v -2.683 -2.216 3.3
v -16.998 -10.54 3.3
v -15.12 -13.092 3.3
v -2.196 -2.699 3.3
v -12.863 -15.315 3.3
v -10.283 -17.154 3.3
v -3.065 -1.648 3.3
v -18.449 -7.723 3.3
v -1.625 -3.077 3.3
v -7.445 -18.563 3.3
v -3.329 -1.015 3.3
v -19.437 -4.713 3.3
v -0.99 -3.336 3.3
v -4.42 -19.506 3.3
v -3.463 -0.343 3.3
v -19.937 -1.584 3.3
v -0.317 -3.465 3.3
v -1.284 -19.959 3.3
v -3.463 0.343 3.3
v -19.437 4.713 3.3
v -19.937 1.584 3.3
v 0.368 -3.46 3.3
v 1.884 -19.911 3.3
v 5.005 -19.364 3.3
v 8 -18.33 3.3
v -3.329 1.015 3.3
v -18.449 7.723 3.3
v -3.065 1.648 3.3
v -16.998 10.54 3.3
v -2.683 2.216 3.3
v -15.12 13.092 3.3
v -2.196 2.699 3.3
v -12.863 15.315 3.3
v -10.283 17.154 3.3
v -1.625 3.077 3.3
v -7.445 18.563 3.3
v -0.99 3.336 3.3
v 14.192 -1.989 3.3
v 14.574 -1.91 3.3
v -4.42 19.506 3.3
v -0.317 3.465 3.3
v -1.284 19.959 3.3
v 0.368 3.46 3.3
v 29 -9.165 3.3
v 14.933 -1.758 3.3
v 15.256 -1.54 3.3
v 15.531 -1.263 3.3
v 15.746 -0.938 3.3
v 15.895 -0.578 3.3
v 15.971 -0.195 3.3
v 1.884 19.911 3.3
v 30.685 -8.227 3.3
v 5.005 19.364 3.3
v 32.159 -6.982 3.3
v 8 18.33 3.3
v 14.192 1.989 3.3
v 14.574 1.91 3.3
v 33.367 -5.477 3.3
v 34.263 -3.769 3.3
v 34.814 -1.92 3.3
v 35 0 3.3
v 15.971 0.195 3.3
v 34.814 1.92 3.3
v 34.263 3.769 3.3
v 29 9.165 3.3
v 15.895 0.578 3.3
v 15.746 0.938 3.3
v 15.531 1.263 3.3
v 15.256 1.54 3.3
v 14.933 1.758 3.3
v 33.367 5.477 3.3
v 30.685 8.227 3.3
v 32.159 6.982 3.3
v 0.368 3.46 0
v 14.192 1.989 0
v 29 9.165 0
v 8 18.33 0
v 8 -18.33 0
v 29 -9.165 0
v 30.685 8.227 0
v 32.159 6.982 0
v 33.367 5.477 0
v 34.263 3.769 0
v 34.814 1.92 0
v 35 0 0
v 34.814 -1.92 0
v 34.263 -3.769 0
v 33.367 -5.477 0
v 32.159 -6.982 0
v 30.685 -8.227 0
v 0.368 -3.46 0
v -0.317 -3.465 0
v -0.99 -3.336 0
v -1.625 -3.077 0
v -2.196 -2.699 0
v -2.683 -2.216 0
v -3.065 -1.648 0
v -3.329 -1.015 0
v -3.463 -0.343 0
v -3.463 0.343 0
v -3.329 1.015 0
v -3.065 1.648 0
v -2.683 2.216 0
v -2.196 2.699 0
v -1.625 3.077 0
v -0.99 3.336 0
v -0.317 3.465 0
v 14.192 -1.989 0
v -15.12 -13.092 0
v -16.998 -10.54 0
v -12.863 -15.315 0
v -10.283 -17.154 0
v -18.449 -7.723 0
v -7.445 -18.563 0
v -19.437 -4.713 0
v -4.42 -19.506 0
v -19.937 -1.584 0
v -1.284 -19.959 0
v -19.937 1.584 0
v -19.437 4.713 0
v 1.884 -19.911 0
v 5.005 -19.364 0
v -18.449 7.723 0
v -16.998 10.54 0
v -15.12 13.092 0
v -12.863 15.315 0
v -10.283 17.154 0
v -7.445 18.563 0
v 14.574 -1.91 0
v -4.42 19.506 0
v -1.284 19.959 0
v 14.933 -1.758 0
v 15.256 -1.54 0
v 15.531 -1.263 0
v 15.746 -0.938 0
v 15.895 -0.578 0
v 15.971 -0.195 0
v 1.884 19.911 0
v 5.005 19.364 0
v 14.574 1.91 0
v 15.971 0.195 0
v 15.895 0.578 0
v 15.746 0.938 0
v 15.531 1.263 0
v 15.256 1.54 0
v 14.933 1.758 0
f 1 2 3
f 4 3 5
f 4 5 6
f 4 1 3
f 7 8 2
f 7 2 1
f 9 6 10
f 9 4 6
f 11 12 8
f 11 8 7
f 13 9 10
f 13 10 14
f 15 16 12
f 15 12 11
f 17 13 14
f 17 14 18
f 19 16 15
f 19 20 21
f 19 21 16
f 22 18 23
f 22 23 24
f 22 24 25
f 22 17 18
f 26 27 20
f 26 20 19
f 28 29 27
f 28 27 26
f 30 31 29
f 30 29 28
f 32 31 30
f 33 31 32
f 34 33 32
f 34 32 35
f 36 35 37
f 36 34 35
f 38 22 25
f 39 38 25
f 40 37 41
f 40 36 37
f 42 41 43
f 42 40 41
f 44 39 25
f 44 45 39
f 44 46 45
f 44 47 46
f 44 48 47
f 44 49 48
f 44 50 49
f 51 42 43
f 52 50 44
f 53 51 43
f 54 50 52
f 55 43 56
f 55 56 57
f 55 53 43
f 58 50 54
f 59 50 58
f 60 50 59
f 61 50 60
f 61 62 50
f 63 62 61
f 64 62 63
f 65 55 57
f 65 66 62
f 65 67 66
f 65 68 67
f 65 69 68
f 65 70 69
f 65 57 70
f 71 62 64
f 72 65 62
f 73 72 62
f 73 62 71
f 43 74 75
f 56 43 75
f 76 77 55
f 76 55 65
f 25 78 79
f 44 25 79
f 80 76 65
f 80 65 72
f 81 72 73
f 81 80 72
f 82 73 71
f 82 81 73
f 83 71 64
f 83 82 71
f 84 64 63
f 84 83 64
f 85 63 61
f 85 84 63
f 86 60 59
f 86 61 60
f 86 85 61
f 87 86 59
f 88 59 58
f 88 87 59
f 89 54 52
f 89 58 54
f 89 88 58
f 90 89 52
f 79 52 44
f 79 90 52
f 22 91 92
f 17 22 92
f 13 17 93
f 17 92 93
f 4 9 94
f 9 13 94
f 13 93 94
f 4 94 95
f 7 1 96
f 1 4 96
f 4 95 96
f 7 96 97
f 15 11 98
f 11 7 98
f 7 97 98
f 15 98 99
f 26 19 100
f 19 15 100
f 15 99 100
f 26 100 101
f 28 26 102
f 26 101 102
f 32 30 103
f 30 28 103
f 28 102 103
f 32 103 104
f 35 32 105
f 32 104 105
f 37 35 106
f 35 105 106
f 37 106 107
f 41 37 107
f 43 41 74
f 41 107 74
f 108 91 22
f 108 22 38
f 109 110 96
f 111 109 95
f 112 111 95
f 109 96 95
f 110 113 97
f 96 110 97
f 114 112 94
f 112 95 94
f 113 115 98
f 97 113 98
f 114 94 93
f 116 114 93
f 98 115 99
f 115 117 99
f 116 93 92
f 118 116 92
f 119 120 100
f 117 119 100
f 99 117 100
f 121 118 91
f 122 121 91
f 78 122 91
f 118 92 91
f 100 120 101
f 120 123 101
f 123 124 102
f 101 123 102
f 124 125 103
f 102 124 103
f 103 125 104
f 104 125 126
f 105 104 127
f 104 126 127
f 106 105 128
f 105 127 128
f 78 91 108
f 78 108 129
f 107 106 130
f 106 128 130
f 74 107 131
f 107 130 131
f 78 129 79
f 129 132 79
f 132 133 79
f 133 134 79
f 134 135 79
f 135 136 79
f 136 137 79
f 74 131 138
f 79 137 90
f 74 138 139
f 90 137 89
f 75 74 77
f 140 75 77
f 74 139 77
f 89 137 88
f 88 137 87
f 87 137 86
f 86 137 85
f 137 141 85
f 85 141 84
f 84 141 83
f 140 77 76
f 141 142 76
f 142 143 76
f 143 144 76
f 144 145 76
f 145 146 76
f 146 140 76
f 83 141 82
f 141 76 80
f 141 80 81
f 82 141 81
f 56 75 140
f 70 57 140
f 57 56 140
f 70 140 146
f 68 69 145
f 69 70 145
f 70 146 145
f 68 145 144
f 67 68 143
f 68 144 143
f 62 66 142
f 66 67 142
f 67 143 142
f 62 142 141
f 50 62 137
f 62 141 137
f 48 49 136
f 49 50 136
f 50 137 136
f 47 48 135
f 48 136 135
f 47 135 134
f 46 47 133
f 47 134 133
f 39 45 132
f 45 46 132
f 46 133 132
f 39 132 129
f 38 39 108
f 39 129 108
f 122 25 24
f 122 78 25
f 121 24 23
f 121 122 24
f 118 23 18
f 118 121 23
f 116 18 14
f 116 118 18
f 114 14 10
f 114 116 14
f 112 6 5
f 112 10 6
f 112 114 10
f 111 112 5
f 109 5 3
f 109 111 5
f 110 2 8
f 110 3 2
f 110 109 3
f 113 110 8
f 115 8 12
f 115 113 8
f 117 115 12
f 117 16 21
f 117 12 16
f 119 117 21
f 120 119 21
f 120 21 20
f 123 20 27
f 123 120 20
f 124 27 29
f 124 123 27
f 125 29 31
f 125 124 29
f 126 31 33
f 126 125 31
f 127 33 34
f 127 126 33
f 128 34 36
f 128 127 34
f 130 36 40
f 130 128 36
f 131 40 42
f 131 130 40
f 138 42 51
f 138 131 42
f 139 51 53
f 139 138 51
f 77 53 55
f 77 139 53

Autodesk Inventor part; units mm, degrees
ref_plane "YZ Plane" through (0, 0, 0) normal (1, 0, 0) x (0, 1, 0)
ref_plane "XZ Plane" through (0, 0, 0) normal (0, 1, 0) x (-1, 0, 0)
ref_plane "XY Plane" through (0, 0, 0) normal (0, 0, 1) x (1, 0, 0)
sketch "Sketch1" plane through (0, 0, 0) normal (0, 0, 1) x (1, 0, 0)
  line L0 (0.3684, -3.4604) -> (14.1917, -1.9888)
  arc A0 (0.3684, 3.4604) -> (0.3684, -3.4604) centre (0, 0) ccw
  line L1 (0.3684, 3.4604) -> (14.1917, 1.9888)
  arc A1 (14.1917, -1.9888) -> (14.1917, 1.9888) centre (13.98, 0) ccw
  line L2 (8, -18.3303) -> (29, -9.1652)
  line L3 (8, 18.3303) -> (29, 9.1652)
  arc A2 (29, -9.1652) -> (29, 9.1652) centre (25, 0) ccw
  arc A3 (8, 18.3303) -> (8, -18.3303) centre (0, 0) ccw
  dimension "d13" = 3.48
  dimension "d14" = 2
  dimension "d15" = 19.46
  dimension "d17" = 20
  dimension "d18" = 10
  dimension "d19" = 25
extrude "Extrusion2" add sketch "Sketch1" along normal blind 3.3
equation "\"d17\" = radio_muslo"
equation "\"d18\" = 0.5 * radio_muslo"
equation "\"radio_muslo\" = 20"
properties part number "Pata - Soporte Antebrazo"
